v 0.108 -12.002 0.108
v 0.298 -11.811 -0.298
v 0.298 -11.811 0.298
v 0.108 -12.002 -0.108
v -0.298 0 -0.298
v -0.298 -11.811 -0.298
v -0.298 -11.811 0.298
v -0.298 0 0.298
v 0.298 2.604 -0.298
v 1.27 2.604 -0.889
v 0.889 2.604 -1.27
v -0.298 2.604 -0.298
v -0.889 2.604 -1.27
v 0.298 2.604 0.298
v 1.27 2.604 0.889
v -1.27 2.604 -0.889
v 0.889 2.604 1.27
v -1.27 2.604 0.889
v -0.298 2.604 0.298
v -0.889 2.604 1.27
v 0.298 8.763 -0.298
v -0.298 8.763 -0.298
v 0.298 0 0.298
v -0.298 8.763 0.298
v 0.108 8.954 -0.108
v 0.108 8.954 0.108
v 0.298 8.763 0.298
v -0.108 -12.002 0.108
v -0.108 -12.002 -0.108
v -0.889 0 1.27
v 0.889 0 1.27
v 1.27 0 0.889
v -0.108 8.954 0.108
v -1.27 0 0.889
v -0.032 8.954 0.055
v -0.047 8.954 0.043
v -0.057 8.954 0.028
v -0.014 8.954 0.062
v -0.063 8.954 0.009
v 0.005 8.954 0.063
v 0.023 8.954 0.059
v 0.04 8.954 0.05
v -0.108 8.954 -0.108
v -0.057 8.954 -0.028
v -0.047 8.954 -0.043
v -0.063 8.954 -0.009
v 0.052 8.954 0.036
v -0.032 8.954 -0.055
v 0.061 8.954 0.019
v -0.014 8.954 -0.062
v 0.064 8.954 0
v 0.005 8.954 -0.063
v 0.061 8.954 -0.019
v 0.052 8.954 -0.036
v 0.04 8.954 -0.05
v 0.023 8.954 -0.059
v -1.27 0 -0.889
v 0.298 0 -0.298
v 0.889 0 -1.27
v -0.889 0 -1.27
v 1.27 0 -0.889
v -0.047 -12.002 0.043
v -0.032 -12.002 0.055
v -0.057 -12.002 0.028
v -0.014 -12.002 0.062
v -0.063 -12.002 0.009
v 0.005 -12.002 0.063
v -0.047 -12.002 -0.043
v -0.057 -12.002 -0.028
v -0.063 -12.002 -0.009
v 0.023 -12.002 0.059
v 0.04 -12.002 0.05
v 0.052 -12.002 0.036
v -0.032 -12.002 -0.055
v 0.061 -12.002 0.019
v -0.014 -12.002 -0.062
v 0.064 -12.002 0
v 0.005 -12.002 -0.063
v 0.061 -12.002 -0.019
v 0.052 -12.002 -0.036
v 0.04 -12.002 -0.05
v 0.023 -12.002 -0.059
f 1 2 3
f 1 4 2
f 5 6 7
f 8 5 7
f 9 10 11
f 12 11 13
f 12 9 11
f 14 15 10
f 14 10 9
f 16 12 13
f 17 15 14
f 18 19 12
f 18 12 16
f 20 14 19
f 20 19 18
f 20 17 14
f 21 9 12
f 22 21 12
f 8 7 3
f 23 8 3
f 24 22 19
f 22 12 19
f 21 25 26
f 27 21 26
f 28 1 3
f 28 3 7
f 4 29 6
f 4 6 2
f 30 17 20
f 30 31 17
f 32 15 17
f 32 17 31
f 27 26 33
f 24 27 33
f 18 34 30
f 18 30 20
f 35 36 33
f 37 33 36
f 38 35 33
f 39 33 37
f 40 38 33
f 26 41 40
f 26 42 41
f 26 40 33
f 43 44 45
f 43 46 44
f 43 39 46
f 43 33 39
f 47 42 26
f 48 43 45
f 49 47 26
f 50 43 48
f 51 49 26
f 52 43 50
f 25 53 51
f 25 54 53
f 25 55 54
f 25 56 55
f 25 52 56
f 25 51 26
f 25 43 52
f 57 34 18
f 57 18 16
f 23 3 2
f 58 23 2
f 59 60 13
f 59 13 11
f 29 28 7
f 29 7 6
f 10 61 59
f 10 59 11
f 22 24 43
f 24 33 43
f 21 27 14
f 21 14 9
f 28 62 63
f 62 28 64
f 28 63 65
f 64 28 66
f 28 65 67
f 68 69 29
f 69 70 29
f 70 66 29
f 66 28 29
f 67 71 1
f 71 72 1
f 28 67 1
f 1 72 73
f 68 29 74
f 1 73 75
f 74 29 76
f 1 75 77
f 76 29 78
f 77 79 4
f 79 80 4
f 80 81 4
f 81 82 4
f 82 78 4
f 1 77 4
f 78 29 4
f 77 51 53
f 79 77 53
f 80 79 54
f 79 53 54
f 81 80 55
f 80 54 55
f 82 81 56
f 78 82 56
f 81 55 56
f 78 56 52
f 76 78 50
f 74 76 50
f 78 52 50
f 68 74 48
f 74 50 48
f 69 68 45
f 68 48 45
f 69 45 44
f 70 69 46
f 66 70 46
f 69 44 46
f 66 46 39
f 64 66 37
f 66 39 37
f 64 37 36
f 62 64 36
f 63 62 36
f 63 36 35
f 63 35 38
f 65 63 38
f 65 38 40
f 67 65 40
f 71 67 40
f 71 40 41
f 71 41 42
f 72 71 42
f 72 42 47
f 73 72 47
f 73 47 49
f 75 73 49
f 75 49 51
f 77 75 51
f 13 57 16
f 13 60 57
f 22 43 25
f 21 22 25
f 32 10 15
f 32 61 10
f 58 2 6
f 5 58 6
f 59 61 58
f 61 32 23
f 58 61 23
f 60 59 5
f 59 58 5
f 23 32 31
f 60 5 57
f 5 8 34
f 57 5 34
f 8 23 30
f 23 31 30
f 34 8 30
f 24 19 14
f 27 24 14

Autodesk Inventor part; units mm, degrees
ref_plane "YZ Plane" through (0, 0, 0) normal (1, 0, 0) x (0, 1, 0)
ref_plane "XZ Plane" through (0, 0, 0) normal (0, 1, 0) x (-1, 0, 0)
ref_plane "XY Plane" through (0, 0, 0) normal (0, 0, 1) x (1, 0, 0)
sketch "Sketch1" plane through (0, 0, 0) normal (0, 1, 0) x (-1, 0, 0)
  line L0 (-1.27, 1.27) -> (1.27, 1.27)
  line L1 (1.27, 1.27) -> (1.27, -1.27)
  line L2 (1.27, -1.27) -> (-1.27, -1.27)
  line L3 (-1.27, -1.27) -> (-1.27, 1.27)
  line L4 (-1.27, 1.27) -> (1.27, -1.27) construction
  line L5 (1.27, 1.27) -> (-1.27, -1.27) construction
  point P0 (0, 0)
  dimension "d0" = 2.54
extrude "Extrusion1" add sketch "Sketch1" along normal blind 2.6035
chamfer "Chamfer1" distance 0.381 angle 45 4 edges at (1.27, 1.3017, 1.27) (-1.27, 1.3017, 1.27) (1.27, 1.3017, -1.27) (-1.27, 1.3017, -1.27)
sketch "Sketch2" plane through (0, 2.6035, 0) normal (0, 1, 0) x (1, 0, 0)
  line L0 (0.2984, 0.2984) -> (-0.2984, 0.2984)
  line L1 (-0.2984, 0.2984) -> (-0.2984, -0.2984)
  line L2 (-0.2984, -0.2984) -> (0.2984, -0.2984)
  line L3 (0.2984, -0.2984) -> (0.2984, 0.2984)
  line L4 (0.2984, 0.2984) -> (-0.2984, -0.2984) construction
  line L5 (-0.2984, 0.2984) -> (0.2984, -0.2984) construction
  point P0 (0, 0)
  dimension "d6" = 0.5969
extrude "Extrusion2" add sketch "Sketch2" along normal blind 6.35 and the other way blind 14.605
chamfer "Chamfer2" distance 0.1905 angle 45 8 edges at (0.2984, 8.9535, 0) (0, 8.9535, -0.2984) (-0.2984, 8.9535, 0) (0, 8.9535, 0.2984) (0, -12.0015, -0.2984) (0.2984, -12.0015, 0) (0, -12.0015, 0.2984) (-0.2984, -12.0015, 0)
sketch "Sketch3" plane through (0, 8.9535, 0) normal (0, 1, 0) x (1, 0, 0)
  circle A0 centre (0, 0) radius 0.0635
  dimension "d14" = 0.127
extrude "Extrusion3" cut sketch "Sketch3" against normal through all
properties part number "Single Long Male Header"
